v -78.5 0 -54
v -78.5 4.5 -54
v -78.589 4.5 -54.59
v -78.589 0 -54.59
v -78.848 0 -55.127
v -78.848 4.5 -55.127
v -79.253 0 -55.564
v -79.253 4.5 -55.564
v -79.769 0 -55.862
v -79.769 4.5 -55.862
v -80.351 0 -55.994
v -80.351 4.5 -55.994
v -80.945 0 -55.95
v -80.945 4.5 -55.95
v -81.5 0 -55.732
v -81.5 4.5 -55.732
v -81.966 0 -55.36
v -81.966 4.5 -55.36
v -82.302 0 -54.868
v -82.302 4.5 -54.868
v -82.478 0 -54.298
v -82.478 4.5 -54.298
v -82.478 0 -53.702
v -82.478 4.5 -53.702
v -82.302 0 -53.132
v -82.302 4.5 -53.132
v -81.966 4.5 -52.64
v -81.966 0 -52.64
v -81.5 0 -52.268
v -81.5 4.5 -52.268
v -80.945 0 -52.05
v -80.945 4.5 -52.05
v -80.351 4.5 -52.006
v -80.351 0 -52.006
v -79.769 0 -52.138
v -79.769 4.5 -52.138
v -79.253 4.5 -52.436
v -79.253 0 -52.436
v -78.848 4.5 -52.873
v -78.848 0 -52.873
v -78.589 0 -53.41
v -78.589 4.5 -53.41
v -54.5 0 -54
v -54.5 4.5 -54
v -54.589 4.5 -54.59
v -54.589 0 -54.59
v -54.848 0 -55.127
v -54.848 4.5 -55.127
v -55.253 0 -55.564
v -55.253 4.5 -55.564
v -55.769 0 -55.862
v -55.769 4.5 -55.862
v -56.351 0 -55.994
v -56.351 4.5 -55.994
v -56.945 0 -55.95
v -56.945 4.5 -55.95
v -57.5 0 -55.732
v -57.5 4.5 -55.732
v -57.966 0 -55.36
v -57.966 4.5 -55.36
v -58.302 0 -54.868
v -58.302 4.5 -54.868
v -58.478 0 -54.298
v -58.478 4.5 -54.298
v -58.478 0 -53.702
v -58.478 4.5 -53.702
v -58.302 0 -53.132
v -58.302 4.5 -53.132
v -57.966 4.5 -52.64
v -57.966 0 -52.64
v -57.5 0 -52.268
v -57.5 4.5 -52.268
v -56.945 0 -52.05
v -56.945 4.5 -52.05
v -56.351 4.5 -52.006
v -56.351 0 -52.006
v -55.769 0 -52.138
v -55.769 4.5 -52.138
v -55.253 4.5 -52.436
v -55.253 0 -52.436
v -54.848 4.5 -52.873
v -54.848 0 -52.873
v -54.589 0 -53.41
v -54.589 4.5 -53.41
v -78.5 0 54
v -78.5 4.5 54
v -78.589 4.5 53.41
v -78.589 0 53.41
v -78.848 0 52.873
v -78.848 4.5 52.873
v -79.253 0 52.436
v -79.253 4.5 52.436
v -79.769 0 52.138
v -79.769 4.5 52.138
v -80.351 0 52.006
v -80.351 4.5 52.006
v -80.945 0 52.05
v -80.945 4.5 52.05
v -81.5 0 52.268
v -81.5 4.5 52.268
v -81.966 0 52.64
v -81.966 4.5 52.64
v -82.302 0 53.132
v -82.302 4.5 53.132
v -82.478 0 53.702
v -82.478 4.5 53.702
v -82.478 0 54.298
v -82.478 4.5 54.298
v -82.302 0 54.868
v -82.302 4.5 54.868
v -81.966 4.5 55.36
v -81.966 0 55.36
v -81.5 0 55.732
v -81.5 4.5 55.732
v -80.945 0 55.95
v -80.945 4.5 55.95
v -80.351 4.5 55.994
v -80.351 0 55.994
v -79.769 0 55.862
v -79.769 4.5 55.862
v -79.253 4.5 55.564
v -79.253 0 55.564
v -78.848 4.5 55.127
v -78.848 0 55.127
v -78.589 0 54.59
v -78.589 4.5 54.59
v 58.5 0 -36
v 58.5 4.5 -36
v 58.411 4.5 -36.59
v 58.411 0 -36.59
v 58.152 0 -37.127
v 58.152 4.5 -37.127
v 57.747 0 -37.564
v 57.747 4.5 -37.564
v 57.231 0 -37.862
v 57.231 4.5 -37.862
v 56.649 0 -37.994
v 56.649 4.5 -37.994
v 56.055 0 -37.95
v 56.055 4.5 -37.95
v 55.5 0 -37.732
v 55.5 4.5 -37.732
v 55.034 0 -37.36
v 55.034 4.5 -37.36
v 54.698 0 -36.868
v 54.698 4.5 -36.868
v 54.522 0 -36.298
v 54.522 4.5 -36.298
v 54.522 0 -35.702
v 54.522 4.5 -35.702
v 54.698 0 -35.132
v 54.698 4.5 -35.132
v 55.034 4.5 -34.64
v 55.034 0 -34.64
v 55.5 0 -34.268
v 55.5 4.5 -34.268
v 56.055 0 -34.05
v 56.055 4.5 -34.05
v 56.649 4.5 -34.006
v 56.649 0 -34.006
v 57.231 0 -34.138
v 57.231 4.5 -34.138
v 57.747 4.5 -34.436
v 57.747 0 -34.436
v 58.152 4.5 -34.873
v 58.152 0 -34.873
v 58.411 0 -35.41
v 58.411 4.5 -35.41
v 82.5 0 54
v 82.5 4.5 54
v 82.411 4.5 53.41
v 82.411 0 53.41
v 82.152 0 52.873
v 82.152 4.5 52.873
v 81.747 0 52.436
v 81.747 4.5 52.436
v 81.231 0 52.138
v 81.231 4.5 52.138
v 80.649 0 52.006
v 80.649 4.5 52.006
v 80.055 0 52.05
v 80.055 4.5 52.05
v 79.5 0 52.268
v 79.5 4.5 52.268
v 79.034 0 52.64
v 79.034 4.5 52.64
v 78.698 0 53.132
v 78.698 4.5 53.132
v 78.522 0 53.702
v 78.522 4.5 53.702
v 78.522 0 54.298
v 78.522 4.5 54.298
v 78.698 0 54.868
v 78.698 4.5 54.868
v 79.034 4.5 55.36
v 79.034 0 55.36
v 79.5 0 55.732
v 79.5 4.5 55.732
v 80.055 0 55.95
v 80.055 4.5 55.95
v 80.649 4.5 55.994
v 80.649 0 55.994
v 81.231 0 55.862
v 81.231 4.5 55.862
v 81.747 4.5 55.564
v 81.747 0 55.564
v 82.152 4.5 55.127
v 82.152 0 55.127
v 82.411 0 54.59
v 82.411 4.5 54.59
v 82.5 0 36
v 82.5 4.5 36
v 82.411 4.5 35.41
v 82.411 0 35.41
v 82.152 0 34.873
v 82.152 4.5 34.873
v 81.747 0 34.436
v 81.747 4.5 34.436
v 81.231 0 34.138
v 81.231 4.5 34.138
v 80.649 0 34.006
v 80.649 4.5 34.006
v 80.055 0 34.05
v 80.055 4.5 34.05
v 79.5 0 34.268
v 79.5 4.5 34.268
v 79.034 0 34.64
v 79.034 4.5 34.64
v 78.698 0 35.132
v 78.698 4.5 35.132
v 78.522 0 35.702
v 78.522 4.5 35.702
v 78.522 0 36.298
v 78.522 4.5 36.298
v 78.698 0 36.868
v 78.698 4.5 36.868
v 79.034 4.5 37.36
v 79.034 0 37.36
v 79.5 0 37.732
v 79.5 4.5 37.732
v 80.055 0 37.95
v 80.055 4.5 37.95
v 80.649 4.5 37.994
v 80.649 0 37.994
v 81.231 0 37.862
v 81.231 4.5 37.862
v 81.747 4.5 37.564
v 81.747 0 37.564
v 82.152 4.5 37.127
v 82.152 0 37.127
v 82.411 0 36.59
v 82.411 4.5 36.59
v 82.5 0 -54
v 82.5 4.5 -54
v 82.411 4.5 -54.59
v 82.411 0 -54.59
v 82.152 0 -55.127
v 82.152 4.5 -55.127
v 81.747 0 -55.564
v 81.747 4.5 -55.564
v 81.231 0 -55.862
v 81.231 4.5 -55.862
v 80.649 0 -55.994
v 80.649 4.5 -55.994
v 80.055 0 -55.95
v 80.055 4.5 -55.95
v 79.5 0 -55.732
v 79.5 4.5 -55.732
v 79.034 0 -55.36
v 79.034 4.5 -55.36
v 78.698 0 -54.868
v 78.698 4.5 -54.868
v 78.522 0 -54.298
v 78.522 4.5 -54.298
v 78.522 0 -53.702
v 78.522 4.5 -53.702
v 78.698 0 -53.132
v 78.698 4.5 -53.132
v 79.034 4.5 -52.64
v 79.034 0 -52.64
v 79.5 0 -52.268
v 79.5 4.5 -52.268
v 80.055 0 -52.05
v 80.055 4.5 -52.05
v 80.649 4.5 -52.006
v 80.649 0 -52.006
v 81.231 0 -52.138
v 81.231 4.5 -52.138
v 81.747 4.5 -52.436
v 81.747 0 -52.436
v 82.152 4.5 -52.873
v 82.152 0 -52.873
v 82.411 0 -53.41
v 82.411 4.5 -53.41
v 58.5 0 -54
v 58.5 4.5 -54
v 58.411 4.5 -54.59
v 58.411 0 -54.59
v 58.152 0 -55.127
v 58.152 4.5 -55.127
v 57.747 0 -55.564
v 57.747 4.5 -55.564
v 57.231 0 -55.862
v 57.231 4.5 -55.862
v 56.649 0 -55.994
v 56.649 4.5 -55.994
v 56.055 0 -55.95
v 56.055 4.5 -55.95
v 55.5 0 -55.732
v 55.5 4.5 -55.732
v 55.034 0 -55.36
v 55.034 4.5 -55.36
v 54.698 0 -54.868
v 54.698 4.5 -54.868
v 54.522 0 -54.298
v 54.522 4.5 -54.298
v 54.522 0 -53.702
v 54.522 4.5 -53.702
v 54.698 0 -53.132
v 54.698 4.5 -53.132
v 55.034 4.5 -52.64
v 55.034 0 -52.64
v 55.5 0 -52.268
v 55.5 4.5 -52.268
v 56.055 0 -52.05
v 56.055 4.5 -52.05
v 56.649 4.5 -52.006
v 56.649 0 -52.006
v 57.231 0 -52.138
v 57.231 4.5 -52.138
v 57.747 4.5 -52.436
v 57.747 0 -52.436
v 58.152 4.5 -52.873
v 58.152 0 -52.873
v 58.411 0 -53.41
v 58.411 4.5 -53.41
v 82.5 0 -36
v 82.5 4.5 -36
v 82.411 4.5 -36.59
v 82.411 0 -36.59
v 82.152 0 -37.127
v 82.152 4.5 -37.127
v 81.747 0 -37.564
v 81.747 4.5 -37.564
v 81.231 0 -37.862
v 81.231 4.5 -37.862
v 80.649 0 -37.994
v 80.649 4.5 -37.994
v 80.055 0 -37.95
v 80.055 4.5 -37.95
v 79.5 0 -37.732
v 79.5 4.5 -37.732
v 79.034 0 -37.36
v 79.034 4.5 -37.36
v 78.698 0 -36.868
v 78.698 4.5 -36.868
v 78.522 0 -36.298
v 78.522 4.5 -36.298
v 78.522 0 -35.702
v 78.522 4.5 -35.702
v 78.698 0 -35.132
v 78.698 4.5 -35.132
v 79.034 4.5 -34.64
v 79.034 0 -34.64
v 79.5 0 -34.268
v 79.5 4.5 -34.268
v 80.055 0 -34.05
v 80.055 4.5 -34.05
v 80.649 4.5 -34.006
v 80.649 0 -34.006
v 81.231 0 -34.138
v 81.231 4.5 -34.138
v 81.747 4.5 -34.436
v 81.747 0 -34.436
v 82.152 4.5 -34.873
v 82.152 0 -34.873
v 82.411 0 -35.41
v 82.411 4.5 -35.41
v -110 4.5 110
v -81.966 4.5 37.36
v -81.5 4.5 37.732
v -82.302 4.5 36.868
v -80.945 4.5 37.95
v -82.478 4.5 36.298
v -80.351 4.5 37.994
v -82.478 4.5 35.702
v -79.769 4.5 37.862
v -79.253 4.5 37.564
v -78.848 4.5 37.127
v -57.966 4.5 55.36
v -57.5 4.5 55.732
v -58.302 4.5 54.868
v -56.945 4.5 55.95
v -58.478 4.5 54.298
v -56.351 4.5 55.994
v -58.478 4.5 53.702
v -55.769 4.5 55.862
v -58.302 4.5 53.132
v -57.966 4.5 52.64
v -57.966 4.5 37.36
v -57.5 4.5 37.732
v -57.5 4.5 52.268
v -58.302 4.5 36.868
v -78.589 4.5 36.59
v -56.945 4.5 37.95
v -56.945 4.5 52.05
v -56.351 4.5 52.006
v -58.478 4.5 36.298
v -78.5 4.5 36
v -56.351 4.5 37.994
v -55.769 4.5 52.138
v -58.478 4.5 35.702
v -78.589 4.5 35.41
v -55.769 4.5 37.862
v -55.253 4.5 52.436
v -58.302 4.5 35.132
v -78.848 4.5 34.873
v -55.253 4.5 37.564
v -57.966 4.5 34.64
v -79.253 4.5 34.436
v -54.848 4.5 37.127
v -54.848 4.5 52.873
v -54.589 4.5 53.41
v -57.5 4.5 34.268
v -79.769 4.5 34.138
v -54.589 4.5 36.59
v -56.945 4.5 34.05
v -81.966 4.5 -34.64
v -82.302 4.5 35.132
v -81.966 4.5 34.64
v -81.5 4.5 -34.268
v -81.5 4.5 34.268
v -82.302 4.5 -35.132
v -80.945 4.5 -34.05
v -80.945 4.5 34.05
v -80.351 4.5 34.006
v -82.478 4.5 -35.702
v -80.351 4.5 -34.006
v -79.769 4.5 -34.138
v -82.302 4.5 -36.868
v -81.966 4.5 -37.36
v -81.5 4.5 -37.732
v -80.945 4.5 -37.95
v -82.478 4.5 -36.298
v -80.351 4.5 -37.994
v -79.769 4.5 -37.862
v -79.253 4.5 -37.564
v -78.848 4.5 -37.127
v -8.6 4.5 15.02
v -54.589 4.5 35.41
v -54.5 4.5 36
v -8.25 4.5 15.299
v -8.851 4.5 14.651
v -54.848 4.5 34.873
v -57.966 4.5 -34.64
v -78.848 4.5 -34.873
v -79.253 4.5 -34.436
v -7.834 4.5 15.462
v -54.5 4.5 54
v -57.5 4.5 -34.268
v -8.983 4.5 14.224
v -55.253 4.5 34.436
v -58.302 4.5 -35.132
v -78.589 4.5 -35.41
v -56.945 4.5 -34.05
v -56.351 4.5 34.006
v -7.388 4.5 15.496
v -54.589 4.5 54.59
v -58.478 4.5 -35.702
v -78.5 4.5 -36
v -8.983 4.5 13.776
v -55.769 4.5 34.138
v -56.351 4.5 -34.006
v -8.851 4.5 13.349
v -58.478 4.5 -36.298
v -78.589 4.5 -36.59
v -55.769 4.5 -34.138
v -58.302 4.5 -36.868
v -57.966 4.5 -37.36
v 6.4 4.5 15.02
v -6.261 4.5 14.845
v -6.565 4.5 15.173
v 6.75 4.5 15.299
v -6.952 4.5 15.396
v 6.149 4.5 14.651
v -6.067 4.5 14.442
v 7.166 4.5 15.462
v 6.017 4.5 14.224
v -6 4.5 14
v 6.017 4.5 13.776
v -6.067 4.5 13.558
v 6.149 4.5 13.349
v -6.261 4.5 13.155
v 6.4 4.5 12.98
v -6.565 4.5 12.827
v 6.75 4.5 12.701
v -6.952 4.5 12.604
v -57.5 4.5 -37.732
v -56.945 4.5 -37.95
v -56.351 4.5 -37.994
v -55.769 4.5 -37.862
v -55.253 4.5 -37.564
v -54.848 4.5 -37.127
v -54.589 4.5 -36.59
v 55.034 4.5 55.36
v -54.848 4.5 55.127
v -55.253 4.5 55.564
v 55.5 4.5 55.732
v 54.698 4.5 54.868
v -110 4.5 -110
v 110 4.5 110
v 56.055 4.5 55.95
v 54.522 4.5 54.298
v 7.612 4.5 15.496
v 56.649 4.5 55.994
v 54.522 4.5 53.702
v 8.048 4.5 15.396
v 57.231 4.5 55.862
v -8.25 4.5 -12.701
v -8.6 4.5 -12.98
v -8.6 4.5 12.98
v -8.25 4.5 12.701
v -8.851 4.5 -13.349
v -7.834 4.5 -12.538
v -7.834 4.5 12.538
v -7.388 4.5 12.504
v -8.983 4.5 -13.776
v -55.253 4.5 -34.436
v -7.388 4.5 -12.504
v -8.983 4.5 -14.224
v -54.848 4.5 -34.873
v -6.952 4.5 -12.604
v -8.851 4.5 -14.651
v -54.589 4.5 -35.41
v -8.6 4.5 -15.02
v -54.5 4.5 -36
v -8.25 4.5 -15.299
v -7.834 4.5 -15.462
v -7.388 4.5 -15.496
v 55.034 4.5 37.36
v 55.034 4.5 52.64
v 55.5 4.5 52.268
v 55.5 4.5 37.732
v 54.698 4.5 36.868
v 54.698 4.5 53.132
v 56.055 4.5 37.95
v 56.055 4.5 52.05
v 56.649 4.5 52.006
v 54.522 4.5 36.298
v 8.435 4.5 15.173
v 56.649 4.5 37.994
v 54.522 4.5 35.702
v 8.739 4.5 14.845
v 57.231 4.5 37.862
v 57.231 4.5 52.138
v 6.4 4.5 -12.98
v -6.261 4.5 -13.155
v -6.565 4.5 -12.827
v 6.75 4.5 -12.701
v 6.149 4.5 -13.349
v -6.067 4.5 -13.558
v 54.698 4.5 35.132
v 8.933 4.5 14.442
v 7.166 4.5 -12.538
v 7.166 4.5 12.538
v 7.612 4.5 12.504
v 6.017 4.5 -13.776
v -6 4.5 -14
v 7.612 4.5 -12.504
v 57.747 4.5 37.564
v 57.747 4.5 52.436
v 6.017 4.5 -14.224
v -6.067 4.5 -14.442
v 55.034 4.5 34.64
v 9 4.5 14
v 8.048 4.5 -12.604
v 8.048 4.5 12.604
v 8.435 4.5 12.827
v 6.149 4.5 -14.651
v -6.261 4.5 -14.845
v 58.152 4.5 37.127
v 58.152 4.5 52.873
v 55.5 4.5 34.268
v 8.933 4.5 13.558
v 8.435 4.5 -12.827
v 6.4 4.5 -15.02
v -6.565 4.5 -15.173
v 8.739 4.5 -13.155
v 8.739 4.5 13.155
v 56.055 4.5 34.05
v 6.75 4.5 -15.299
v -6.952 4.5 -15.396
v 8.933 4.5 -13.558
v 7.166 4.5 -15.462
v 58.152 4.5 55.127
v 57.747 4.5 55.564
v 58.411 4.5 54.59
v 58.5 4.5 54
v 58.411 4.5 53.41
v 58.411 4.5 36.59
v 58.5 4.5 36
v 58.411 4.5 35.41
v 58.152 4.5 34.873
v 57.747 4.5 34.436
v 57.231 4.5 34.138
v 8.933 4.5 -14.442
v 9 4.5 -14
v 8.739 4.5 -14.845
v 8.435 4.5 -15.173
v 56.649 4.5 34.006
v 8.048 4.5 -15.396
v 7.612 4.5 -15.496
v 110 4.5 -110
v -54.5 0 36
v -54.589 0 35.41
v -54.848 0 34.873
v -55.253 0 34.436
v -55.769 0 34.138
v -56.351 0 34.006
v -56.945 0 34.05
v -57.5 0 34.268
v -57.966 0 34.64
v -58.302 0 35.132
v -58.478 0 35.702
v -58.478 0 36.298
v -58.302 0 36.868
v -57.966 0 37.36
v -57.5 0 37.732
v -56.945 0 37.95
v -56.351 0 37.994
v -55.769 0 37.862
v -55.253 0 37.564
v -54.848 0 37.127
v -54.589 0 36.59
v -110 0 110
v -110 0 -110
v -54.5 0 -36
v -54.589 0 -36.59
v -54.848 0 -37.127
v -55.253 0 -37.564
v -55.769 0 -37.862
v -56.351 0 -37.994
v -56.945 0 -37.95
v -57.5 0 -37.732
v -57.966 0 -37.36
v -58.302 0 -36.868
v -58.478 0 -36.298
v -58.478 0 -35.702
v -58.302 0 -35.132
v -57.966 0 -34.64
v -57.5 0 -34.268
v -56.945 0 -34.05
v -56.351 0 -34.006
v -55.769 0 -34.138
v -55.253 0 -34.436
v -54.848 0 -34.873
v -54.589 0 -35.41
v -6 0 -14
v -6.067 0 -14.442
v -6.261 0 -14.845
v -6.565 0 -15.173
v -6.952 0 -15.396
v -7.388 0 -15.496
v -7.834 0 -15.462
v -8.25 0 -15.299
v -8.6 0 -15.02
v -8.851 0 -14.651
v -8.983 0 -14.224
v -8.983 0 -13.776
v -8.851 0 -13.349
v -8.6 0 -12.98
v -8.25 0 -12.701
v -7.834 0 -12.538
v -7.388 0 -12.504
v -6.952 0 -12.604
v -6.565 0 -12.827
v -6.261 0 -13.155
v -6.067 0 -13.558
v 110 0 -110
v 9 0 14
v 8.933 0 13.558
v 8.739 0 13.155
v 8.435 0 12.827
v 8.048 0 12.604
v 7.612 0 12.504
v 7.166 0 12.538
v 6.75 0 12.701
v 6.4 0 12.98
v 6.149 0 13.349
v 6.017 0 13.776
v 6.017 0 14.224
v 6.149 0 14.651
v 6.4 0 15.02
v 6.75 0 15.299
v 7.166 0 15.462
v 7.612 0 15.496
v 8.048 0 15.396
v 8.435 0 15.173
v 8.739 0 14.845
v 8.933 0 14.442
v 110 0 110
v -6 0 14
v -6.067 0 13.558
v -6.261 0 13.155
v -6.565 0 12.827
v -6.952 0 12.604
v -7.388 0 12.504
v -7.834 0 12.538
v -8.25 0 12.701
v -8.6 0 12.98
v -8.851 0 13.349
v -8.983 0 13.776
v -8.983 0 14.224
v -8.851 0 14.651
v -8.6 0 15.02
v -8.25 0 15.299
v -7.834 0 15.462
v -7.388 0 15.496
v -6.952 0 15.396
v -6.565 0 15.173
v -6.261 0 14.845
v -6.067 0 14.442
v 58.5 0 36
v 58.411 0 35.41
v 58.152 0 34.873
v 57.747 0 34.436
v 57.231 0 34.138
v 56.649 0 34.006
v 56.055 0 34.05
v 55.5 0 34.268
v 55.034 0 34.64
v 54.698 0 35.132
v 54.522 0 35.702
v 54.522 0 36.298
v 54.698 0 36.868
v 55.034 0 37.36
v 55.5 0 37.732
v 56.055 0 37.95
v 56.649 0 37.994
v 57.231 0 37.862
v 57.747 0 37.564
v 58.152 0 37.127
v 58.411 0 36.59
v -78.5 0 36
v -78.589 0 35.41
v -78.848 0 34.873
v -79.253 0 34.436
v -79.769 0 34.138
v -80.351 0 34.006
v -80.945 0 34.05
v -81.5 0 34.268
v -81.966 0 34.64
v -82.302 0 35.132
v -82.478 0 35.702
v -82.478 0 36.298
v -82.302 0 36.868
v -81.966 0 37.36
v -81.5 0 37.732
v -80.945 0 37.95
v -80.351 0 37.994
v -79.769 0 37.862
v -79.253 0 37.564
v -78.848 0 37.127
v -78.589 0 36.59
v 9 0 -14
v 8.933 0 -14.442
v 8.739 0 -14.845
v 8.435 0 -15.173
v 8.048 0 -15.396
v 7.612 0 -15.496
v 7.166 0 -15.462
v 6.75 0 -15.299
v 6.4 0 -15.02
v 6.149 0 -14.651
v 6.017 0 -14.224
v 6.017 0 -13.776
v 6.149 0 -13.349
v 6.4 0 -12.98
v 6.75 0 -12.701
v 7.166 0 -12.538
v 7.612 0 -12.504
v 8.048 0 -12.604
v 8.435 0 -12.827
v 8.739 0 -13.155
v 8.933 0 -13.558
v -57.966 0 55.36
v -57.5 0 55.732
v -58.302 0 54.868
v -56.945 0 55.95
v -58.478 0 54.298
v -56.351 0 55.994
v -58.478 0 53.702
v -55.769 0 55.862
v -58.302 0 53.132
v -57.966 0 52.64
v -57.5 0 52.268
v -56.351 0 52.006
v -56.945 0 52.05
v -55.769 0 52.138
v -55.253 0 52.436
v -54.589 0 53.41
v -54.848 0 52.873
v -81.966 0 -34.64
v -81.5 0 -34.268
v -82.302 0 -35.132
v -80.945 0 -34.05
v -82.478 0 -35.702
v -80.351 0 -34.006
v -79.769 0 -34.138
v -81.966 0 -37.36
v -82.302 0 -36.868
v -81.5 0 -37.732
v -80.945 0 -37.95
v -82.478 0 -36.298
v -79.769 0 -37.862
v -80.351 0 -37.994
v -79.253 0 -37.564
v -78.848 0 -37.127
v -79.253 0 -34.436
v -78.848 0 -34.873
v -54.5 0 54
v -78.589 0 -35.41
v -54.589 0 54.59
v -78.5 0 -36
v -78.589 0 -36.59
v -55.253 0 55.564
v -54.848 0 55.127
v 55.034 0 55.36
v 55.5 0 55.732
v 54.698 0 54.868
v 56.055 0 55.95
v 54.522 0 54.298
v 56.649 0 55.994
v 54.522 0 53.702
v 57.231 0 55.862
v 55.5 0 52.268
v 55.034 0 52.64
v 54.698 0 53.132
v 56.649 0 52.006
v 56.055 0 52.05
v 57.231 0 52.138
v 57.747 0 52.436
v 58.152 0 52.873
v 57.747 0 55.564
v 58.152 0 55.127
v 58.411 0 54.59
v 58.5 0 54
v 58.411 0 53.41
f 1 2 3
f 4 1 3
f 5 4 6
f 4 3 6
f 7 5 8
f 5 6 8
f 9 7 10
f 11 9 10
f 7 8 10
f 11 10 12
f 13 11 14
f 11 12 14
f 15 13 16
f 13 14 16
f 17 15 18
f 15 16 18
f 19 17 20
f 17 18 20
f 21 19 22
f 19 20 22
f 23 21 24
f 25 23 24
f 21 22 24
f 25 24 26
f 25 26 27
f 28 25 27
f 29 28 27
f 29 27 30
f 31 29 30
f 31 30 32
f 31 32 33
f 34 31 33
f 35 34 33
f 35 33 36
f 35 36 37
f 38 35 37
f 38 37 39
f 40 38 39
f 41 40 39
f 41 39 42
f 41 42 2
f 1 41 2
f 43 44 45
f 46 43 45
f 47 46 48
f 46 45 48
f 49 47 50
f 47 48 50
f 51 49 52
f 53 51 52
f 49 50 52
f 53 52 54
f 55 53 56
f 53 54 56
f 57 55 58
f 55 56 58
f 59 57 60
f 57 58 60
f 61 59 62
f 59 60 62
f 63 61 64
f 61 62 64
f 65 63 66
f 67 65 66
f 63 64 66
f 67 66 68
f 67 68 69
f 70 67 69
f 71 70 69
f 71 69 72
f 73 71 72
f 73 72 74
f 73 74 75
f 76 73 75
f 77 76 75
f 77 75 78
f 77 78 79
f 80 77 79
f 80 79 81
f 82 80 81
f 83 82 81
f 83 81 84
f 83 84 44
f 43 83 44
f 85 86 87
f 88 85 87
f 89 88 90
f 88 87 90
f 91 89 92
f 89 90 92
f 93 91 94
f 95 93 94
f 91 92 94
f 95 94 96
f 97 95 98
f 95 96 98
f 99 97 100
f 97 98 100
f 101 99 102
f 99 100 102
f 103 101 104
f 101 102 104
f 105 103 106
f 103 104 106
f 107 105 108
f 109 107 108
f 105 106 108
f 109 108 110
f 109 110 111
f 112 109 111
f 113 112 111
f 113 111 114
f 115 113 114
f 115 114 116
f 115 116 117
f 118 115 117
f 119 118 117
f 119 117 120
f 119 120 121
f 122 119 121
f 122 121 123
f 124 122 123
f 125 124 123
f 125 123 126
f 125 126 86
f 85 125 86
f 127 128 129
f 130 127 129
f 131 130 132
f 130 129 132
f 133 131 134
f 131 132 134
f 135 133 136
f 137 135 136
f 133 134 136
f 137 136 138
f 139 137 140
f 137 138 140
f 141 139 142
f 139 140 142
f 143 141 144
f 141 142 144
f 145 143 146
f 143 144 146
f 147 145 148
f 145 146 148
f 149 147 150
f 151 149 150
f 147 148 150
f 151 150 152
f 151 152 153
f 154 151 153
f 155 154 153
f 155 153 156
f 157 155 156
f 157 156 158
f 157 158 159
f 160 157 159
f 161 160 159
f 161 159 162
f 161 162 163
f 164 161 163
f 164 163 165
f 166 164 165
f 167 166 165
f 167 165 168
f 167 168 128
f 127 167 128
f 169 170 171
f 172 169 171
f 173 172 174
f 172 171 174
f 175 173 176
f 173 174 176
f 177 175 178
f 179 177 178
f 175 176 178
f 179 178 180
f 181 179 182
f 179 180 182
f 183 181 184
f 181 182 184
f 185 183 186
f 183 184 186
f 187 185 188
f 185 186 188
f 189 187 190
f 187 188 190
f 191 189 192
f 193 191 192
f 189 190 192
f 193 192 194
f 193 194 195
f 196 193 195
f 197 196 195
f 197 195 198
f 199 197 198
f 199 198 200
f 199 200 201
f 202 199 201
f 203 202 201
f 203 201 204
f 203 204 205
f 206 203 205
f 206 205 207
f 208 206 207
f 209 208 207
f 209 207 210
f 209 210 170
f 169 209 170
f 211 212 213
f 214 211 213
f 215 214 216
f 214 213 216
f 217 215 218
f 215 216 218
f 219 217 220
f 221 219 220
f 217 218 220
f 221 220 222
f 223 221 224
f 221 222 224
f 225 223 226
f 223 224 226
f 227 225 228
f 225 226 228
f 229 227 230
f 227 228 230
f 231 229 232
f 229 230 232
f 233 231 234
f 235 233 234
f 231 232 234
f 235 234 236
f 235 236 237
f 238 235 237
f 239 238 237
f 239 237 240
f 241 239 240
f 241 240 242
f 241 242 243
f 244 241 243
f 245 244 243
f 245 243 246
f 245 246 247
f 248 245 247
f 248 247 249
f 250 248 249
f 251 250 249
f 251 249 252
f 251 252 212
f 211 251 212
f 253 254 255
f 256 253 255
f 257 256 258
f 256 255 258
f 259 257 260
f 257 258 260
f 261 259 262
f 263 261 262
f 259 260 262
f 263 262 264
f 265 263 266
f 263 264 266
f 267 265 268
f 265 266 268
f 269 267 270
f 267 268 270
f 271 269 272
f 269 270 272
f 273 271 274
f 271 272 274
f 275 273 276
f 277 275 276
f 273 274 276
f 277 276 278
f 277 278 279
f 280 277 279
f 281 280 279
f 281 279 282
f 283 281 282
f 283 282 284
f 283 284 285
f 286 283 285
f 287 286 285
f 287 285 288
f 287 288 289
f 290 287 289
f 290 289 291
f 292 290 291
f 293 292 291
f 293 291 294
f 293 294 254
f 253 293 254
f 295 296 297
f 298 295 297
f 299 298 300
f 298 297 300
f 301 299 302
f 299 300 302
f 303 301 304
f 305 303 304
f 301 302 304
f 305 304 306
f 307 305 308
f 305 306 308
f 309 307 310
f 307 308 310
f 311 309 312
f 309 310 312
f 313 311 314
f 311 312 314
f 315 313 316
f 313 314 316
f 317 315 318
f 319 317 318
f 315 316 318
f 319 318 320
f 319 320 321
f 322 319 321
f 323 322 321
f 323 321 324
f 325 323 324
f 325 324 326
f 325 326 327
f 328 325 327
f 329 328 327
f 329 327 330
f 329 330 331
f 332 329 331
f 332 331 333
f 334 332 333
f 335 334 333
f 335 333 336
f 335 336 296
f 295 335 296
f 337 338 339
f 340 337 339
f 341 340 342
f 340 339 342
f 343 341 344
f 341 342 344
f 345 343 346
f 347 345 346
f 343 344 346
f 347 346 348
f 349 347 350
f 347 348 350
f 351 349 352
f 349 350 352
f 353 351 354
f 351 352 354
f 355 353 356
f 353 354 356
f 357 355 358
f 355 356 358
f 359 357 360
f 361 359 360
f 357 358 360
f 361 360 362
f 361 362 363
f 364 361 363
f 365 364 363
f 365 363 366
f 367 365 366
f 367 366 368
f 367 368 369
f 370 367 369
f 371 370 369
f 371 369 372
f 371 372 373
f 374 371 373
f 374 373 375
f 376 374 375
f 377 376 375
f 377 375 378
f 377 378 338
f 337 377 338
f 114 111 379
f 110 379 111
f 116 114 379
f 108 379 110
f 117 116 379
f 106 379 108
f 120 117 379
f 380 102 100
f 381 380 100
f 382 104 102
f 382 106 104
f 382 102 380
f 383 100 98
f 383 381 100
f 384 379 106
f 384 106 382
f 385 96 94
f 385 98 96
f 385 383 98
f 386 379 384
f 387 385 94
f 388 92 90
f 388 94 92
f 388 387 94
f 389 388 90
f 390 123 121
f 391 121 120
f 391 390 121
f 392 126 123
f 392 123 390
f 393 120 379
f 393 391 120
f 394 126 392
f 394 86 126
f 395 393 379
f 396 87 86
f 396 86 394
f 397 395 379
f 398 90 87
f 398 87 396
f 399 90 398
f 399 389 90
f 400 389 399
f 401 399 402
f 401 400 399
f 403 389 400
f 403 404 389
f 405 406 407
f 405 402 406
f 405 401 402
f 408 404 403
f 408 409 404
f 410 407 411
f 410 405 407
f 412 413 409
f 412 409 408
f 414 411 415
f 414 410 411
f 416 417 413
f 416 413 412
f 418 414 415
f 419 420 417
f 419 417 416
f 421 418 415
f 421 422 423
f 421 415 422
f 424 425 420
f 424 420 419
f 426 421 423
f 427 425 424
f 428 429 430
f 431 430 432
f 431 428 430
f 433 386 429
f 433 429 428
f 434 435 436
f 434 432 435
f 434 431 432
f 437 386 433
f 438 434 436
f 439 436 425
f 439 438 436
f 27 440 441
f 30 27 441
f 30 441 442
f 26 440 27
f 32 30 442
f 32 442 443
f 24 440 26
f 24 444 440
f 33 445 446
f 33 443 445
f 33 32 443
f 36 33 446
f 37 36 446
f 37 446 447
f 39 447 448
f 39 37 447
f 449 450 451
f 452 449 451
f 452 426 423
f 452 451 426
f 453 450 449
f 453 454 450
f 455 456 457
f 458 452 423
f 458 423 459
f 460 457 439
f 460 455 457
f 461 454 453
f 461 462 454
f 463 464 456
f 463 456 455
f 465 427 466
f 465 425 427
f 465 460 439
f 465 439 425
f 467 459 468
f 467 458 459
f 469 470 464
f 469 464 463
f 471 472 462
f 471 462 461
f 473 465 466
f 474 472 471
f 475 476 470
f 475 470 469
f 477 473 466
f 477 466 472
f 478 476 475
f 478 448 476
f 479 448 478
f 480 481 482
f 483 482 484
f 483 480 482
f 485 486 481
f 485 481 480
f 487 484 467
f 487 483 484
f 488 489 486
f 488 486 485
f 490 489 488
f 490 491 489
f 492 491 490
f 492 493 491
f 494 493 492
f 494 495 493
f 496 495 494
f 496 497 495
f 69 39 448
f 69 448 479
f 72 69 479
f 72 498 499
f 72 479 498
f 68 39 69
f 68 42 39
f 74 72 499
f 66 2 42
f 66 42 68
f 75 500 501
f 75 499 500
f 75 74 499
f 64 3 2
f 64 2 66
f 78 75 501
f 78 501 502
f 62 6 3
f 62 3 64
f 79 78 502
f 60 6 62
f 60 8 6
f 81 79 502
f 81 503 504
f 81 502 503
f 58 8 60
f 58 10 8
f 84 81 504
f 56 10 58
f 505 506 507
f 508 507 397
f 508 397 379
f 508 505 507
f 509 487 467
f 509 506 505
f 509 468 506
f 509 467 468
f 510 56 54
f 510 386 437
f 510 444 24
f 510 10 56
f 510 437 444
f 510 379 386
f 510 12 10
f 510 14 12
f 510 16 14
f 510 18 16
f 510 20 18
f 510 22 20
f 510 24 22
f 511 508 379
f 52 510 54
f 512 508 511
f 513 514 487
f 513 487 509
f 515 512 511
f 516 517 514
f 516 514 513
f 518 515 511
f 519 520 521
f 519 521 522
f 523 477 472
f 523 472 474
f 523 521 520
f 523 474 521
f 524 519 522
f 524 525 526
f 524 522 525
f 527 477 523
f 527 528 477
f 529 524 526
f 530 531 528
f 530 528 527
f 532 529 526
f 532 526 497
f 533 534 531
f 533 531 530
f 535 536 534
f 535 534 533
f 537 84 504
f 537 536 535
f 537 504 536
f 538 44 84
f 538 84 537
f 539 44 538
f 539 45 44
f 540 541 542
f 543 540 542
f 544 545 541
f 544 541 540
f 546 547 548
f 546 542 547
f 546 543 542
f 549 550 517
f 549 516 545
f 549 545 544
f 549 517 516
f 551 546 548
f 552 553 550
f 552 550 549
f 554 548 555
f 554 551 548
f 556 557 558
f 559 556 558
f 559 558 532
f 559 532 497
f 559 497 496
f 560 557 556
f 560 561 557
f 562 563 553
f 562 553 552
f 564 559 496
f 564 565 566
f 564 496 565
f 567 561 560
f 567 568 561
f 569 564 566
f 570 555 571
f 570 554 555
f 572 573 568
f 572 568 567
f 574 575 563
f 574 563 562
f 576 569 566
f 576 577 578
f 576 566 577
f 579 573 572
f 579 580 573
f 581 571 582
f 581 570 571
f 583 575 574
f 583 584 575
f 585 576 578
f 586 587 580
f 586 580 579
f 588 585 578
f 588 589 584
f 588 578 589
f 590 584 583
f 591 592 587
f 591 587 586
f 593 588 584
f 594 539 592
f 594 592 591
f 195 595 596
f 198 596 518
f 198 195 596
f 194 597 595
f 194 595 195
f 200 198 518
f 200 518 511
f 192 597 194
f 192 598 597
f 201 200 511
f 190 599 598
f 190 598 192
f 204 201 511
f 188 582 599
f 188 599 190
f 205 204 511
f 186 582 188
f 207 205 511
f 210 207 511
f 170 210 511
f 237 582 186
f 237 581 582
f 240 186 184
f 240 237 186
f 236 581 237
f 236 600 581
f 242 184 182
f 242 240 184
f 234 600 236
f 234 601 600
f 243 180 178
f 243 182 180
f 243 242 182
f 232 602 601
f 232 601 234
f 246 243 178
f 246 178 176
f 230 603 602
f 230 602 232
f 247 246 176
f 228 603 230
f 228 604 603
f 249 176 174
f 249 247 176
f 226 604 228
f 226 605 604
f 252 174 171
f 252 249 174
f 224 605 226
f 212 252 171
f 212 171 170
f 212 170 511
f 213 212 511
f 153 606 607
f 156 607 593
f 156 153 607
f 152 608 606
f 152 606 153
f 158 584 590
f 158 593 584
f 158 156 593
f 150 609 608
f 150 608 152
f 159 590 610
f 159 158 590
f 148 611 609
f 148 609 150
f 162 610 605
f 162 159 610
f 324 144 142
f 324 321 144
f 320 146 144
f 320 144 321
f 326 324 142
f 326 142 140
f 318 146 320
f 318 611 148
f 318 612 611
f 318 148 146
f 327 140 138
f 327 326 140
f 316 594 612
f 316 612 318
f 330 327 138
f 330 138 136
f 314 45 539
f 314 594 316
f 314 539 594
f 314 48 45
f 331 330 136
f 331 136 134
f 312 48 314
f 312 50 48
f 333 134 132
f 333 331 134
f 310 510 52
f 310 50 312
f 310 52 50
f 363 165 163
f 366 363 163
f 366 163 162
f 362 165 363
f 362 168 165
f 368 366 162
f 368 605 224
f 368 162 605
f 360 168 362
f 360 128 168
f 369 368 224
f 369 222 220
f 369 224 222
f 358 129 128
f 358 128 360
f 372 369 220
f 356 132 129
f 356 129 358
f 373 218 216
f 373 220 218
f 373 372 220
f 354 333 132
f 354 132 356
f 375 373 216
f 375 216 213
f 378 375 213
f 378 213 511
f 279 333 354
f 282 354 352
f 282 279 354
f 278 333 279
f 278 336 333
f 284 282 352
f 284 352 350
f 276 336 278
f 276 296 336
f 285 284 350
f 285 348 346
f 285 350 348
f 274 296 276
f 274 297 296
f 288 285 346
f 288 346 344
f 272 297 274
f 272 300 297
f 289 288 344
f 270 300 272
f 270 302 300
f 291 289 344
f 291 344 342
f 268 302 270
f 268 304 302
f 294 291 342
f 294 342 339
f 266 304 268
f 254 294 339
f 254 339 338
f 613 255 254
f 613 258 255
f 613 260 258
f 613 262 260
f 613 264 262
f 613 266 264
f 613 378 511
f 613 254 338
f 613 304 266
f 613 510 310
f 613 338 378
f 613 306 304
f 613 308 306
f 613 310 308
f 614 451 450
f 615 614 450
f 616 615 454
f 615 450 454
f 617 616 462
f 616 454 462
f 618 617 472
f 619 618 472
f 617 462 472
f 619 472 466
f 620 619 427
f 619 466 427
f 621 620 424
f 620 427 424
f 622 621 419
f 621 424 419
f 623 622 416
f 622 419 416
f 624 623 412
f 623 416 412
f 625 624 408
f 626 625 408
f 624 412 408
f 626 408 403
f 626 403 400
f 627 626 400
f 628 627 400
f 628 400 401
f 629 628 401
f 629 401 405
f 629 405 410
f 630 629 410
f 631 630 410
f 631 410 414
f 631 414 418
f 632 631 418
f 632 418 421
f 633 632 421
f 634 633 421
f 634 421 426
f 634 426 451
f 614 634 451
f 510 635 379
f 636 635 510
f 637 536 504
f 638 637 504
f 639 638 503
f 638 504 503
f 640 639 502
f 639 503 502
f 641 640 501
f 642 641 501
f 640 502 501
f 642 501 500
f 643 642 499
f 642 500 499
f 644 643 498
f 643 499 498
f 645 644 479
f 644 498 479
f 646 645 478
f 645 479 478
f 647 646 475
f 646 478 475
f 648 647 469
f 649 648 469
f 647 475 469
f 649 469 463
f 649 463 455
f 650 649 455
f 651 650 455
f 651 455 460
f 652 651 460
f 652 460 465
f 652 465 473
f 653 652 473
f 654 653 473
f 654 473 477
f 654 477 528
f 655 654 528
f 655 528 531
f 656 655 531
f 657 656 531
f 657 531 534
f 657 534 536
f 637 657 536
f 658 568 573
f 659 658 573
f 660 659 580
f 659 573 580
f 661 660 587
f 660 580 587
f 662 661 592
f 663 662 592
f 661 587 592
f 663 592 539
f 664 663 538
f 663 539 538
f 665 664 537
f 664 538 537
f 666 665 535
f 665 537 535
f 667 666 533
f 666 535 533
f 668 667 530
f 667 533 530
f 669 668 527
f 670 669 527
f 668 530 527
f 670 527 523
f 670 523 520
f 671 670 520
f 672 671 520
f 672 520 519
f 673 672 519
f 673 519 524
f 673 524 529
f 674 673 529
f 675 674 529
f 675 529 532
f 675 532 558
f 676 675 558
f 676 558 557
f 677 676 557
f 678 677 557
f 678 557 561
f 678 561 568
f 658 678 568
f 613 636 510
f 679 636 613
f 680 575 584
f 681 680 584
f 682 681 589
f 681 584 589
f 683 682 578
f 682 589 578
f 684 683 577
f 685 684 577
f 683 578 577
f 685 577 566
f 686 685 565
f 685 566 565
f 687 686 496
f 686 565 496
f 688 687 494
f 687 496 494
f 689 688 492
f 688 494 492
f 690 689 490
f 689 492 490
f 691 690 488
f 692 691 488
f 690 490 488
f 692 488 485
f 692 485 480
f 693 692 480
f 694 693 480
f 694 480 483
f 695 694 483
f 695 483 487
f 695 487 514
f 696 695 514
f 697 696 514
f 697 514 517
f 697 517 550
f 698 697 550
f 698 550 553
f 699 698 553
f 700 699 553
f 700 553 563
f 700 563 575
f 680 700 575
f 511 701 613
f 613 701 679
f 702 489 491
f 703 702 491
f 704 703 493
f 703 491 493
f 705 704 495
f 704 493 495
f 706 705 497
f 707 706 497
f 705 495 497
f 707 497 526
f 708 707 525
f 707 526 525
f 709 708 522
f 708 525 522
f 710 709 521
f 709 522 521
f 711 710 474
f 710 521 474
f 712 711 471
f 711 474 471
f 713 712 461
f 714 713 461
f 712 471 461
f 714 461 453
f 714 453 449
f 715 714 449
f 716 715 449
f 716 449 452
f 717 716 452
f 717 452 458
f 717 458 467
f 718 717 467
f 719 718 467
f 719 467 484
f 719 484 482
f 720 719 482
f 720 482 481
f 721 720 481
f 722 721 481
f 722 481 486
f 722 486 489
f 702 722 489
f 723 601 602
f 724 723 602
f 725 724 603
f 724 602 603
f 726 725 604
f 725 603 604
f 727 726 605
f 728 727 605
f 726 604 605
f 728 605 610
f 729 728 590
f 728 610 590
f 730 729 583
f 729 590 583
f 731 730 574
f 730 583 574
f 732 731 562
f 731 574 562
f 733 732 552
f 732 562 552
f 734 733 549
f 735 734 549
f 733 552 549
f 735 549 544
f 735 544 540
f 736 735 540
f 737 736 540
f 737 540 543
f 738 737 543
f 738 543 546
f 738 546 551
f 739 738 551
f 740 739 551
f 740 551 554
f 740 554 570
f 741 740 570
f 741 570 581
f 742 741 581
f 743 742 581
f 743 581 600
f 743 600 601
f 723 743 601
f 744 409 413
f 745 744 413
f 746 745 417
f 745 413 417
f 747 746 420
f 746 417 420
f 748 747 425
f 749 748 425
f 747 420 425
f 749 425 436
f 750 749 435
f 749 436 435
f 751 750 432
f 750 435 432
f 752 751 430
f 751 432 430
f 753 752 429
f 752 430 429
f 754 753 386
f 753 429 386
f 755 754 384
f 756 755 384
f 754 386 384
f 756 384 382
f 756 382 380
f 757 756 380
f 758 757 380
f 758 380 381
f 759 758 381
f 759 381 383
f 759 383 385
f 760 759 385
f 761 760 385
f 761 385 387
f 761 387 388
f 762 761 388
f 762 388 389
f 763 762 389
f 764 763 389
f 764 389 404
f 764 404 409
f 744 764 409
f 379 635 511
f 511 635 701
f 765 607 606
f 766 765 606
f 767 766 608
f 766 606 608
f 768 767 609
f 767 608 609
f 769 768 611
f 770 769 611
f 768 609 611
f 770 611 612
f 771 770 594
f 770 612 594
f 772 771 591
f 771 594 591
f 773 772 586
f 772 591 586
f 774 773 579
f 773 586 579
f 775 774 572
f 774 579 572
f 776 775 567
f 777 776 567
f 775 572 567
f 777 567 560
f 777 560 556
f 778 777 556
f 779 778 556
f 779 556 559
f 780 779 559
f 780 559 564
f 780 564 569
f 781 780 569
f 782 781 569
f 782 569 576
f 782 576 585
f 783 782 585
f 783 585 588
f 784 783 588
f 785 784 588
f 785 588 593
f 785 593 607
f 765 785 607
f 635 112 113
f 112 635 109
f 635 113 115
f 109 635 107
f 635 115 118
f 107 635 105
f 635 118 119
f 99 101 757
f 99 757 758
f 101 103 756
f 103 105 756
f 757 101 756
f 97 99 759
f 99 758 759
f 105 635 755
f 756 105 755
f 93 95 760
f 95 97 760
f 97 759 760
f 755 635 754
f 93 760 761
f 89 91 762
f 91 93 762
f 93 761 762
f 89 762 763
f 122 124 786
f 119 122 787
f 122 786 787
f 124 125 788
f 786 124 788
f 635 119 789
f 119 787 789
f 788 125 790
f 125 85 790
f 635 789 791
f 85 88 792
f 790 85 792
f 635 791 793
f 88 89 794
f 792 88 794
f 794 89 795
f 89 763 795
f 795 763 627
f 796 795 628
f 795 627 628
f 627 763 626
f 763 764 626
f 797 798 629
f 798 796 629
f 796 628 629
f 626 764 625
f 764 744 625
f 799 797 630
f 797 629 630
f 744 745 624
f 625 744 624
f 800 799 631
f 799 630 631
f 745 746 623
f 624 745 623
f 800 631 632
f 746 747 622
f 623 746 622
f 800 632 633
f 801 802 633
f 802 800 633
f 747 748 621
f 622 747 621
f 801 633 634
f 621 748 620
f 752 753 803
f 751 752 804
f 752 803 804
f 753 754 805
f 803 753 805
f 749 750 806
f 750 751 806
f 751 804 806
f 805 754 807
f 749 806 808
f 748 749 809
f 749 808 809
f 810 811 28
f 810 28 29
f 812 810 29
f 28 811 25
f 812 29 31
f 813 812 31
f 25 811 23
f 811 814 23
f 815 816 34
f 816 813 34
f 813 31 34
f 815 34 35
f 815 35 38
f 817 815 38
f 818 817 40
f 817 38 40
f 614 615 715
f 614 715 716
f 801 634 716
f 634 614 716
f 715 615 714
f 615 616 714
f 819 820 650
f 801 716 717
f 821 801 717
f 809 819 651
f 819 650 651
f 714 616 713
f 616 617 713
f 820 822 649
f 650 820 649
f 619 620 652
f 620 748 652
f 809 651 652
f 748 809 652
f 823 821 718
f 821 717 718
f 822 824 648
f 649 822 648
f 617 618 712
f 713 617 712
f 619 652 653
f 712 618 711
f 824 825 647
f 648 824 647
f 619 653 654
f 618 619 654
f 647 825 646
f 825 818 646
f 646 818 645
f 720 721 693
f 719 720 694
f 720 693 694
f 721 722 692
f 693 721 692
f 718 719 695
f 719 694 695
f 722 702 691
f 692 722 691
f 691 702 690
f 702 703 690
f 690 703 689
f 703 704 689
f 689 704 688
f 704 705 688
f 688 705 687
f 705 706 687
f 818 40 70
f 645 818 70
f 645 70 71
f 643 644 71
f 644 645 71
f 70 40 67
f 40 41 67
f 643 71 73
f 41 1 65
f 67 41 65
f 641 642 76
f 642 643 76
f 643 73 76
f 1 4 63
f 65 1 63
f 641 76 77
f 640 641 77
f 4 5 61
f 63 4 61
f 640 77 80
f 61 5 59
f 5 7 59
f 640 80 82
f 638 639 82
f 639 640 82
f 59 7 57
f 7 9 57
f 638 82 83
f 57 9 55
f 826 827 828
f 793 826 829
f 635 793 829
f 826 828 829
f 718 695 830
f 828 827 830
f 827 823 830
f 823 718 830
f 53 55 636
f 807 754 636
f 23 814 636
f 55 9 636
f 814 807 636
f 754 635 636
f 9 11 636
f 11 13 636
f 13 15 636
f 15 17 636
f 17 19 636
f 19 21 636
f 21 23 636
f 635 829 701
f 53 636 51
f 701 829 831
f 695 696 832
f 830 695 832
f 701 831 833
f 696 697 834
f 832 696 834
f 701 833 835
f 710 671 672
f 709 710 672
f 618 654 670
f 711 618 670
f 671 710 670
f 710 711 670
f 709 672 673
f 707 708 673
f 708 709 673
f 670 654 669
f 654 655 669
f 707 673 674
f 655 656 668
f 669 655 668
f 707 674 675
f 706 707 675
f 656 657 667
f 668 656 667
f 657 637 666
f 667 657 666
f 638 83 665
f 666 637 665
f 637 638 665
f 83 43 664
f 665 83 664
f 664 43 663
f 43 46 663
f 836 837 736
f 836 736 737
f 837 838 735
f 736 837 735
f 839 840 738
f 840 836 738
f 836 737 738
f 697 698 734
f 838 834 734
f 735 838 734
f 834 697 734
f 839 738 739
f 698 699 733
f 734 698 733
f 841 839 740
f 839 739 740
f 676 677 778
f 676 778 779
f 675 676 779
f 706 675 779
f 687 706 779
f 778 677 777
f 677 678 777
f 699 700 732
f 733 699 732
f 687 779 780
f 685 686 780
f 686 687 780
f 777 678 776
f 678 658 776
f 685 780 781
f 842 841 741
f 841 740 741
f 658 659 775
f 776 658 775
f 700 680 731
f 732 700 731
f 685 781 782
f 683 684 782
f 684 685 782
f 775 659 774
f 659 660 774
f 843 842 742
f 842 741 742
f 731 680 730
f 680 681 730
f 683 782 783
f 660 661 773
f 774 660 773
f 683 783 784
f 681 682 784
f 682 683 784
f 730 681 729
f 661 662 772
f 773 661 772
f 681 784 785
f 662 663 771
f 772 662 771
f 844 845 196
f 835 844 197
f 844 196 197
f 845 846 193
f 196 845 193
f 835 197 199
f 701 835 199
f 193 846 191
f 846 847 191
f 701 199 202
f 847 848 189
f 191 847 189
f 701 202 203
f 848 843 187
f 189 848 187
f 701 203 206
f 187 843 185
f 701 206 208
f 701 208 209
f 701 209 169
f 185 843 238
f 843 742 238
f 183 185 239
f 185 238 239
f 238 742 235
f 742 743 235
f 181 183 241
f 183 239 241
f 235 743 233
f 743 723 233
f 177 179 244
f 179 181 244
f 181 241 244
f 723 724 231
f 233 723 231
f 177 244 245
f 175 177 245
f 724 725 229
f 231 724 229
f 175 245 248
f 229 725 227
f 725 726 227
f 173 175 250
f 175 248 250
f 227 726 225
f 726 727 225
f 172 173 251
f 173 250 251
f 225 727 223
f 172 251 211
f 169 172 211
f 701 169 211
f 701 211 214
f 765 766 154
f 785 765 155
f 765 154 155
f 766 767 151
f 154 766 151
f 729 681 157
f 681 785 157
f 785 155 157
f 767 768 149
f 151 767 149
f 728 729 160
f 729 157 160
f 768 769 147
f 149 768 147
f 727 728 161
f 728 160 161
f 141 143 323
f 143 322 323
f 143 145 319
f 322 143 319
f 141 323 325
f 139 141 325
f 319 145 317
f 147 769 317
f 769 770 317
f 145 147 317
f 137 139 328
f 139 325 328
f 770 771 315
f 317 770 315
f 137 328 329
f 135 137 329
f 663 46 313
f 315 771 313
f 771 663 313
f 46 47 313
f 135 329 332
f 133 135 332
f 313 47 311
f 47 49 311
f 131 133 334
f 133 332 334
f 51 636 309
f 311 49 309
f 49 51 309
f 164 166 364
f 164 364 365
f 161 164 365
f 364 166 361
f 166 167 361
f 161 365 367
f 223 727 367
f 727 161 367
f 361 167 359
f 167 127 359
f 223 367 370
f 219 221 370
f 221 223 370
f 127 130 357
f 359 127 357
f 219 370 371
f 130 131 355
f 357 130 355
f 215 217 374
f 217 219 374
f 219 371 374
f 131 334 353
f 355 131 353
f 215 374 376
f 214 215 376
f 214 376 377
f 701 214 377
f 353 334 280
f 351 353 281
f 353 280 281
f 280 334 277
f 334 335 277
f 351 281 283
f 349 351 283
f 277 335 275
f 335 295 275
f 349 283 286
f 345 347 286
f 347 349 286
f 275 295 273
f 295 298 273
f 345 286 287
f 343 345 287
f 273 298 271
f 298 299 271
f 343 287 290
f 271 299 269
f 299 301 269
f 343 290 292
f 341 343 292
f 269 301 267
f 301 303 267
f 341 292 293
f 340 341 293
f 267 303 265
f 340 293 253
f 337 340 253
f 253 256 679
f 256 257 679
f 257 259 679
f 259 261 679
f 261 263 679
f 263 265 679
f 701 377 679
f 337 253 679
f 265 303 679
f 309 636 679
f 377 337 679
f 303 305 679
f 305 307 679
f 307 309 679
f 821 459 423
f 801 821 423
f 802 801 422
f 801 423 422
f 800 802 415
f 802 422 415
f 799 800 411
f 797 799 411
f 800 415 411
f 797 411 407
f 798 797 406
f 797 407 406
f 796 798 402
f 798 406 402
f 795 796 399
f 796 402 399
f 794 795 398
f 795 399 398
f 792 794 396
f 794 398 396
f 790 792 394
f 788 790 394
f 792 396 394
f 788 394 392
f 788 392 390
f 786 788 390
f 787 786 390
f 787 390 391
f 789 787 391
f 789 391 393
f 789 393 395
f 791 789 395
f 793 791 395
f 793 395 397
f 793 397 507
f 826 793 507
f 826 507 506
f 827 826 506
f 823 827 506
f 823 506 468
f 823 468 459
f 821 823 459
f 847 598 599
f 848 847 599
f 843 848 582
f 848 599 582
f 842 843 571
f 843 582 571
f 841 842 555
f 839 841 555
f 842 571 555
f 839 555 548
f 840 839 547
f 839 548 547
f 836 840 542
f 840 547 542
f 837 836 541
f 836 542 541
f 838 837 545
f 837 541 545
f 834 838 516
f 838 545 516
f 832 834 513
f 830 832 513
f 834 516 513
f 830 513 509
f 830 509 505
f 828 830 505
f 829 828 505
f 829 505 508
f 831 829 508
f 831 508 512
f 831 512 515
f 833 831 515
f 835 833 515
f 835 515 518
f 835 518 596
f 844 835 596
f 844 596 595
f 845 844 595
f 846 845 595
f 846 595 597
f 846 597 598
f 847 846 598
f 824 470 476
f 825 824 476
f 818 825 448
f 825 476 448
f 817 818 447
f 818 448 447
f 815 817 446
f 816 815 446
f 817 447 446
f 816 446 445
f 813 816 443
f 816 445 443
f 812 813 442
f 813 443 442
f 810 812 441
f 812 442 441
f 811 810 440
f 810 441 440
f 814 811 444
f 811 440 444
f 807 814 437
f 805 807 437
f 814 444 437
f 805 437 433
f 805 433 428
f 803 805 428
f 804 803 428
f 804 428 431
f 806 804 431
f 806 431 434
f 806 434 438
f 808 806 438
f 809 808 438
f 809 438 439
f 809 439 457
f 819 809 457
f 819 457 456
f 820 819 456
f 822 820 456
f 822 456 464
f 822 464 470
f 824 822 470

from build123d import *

# Parameters (mm, degrees)
SKETCH1_W           = 220
SKETCH1_H           = 220
BOSS_EXTRUDE1_DEPTH = 4.5
SKETCH2_R           = 1.5
SKETCH2_R_2         = 2
CUT_EXTRUDE1_DEPTH  = 5.5


with BuildPart() as part:
    # Sketch1 → Boss-Extrude1 (new body)
    with BuildSketch(Plane(origin=(0, 0, 0), x_dir=(1, 0, 0), z_dir=(0, 1, 0))):
        Rectangle(SKETCH1_W, SKETCH1_H)
    extrude(amount=BOSS_EXTRUDE1_DEPTH)

    # Sketch2 → Cut-Extrude1 (cut, through all)
    with BuildSketch(Plane(origin=(0, 4.5, 0), x_dir=(1, 0, 0), z_dir=(0, 1, 0))):
        with Locations((-7.5, 14)):
            Circle(SKETCH2_R)
        with Locations((7.5, 14)):
            Circle(SKETCH2_R)
        with Locations((7.5, -14)):
            Circle(SKETCH2_R)
        with Locations((-7.5, -14)):
            Circle(SKETCH2_R)
        with Locations((-80.5, 54)):
            Circle(SKETCH2_R_2)
        with Locations((-80.5, 36)):
            Circle(SKETCH2_R_2)
        with Locations((-56.5, 36)):
            Circle(SKETCH2_R_2)
        with Locations((-56.5, 54)):
            Circle(SKETCH2_R_2)
        with Locations((-56.5, -36)):
            Circle(SKETCH2_R_2)
        with Locations((-56.5, -54)):
            Circle(SKETCH2_R_2)
        with Locations((-80.5, -54)):
            Circle(SKETCH2_R_2)
        with Locations((-80.5, -36)):
            Circle(SKETCH2_R_2)
        with Locations((56.5, -36)):
            Circle(SKETCH2_R_2)
        with Locations((56.5, -54)):
            Circle(SKETCH2_R_2)
        with Locations((80.5, -54)):
            Circle(SKETCH2_R_2)
        with Locations((80.5, -36)):
            Circle(SKETCH2_R_2)
        with Locations((80.5, 36)):
            Circle(SKETCH2_R_2)
        with Locations((80.5, 54)):
            Circle(SKETCH2_R_2)
        with Locations((56.5, 54)):
            Circle(SKETCH2_R_2)
        with Locations((56.5, 36)):
            Circle(SKETCH2_R_2)
    extrude(amount=-CUT_EXTRUDE1_DEPTH, mode=Mode.SUBTRACT)


solid = part.part
